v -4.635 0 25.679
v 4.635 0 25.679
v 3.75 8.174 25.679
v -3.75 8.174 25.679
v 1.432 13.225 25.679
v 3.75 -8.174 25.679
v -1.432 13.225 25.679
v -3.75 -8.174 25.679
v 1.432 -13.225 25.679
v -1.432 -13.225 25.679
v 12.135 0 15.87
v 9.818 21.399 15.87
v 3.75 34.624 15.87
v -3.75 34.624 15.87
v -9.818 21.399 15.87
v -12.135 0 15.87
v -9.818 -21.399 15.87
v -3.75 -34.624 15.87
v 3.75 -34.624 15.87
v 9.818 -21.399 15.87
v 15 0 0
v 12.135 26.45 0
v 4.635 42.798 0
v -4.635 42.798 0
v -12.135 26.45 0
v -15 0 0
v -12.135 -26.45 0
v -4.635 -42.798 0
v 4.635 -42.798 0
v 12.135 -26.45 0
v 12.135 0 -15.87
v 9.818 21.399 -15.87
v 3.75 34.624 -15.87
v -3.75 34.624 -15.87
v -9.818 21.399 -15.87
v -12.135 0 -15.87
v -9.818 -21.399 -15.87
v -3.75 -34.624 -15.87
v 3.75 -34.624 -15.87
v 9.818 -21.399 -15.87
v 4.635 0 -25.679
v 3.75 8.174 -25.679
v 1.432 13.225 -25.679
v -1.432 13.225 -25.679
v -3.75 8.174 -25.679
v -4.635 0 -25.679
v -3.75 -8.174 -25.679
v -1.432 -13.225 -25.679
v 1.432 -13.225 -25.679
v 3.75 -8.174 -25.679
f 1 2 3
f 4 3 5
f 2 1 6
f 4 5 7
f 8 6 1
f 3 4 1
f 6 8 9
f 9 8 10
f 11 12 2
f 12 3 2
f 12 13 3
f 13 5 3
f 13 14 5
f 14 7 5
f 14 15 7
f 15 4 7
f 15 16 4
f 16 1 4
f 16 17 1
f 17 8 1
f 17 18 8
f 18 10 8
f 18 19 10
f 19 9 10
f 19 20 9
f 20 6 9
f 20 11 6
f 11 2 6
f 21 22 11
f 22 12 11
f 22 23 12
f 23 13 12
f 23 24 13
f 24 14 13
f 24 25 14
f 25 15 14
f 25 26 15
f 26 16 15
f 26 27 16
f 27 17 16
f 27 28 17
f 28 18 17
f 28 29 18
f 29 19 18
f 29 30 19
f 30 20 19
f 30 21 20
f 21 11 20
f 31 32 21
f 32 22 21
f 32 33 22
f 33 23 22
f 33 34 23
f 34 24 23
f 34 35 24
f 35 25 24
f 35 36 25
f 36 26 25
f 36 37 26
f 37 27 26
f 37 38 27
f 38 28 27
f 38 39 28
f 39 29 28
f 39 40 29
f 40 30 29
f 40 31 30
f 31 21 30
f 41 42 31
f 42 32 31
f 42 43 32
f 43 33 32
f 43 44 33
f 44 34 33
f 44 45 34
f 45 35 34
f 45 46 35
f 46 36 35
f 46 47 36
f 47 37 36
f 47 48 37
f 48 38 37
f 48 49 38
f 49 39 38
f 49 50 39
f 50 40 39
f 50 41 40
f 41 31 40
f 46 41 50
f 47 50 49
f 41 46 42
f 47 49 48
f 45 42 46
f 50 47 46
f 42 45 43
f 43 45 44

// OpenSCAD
// Generated by SolidPython 1.0.1 on 2020-07-29 00:46:46


scale(v = [5, 15, 9]) {
	sphere(r = 3);
}
/***********************************************
*********      SolidPython code:      **********
************************************************
 
# import packages: SolidPython
from solid import *
from solid.utils import *
from itertools import chain, combinations, permutations


class Resize:

    def __init__(self, scad_file):
        self.scad_file = scad_file
        #self.scad_file = import_scad(scad_file)
        # cone/cylinder param:
        self.r1 = 0
        self.r2 = 0
        self.h = 0
        # rectangular prism param:
        self.w = 0
        self.l = 0
        # ellipse param:
        self.r = 0

    # import OpenScad code (file name corresponds to shape)


    # classify shape + parameters
    def assign(self, param1, param2, param3):
        if self.scad_file == 'cone.scad':
            self.r1 = param1
            self.r2 = param2
            self.h = param3
        elif self.scad_file == 'cylinder.scad':
            self.r1 = param1
            self.r2 = param2
            self.h = param3
        elif self.scad_file == 'rectangularPrism.scad':
            self.h = param1
            self.l = param2
            self.w = param3
        else:
            self.r = param1
            self.h = param2

    # resize parameters
    def iterate(self):
        x = range(3, 20, 2)
        i = 1
        if self.scad_file == 'cone.scad':
            tempList = list(permutations(x, 2))
            for temp in tempList:
                param1 = temp[0]
                param2 = temp[1]
                filepath = 'produced_scad_files/' + 'cone' + str(param1) + '_' + str(param2) + '_' + '.scad'
                scad_render_to_file(cylinder(h=param1, r1=param2, r2=0), filepath)

        elif self.scad_file == 'cylinder.scad':
            tempList = list(permutations(x, 3))
            for temp in tempList:
                param1 = temp[0]
                param2 = temp[1]
                filepath = 'produced_scad_files/' + 'cylinder' + str(param1) + '_' + str(param2) + '_' + '.scad'
                scad_render_to_file(cylinder(h=param1, r1=param2, r2=param2), filepath)

        elif self.scad_file == 'rectangularPrism.scad':
            tempList = list(permutations(x, 3))
            for temp in tempList:
                param1 = temp[0]
                param2 = temp[1]
                param3 = temp[2]
                filepath = 'produced_scad_files/' + 'rectangularPrism' + str(param1) + '_' + str(param2) + '_' + str(
                    param3) + '.scad'
                scad_render_to_file(cube(size=(param1, param2, param3)), filepath)

        elif self.scad_file == 'ellipse.scad':
            tempList = list(permutations(x, 4))
            for temp in tempList:
                param1 = temp[0]
                param2 = temp[1]
                param3 = temp[2]
                param4 = temp[3]
                filepath = 'produced_scad_files/' + 'ellipse' + str(param1) + '_' + str(param2) + '_' + str(param3) + '_' + str(param4) + '.scad'
                scad_render_to_file(scale([param1, param2, param3])(sphere(r=param4)), filepath)

    def render_to_scadfile(self):
        scad_render_to_file(scad, 'example.scad') 
 
************************************************/
